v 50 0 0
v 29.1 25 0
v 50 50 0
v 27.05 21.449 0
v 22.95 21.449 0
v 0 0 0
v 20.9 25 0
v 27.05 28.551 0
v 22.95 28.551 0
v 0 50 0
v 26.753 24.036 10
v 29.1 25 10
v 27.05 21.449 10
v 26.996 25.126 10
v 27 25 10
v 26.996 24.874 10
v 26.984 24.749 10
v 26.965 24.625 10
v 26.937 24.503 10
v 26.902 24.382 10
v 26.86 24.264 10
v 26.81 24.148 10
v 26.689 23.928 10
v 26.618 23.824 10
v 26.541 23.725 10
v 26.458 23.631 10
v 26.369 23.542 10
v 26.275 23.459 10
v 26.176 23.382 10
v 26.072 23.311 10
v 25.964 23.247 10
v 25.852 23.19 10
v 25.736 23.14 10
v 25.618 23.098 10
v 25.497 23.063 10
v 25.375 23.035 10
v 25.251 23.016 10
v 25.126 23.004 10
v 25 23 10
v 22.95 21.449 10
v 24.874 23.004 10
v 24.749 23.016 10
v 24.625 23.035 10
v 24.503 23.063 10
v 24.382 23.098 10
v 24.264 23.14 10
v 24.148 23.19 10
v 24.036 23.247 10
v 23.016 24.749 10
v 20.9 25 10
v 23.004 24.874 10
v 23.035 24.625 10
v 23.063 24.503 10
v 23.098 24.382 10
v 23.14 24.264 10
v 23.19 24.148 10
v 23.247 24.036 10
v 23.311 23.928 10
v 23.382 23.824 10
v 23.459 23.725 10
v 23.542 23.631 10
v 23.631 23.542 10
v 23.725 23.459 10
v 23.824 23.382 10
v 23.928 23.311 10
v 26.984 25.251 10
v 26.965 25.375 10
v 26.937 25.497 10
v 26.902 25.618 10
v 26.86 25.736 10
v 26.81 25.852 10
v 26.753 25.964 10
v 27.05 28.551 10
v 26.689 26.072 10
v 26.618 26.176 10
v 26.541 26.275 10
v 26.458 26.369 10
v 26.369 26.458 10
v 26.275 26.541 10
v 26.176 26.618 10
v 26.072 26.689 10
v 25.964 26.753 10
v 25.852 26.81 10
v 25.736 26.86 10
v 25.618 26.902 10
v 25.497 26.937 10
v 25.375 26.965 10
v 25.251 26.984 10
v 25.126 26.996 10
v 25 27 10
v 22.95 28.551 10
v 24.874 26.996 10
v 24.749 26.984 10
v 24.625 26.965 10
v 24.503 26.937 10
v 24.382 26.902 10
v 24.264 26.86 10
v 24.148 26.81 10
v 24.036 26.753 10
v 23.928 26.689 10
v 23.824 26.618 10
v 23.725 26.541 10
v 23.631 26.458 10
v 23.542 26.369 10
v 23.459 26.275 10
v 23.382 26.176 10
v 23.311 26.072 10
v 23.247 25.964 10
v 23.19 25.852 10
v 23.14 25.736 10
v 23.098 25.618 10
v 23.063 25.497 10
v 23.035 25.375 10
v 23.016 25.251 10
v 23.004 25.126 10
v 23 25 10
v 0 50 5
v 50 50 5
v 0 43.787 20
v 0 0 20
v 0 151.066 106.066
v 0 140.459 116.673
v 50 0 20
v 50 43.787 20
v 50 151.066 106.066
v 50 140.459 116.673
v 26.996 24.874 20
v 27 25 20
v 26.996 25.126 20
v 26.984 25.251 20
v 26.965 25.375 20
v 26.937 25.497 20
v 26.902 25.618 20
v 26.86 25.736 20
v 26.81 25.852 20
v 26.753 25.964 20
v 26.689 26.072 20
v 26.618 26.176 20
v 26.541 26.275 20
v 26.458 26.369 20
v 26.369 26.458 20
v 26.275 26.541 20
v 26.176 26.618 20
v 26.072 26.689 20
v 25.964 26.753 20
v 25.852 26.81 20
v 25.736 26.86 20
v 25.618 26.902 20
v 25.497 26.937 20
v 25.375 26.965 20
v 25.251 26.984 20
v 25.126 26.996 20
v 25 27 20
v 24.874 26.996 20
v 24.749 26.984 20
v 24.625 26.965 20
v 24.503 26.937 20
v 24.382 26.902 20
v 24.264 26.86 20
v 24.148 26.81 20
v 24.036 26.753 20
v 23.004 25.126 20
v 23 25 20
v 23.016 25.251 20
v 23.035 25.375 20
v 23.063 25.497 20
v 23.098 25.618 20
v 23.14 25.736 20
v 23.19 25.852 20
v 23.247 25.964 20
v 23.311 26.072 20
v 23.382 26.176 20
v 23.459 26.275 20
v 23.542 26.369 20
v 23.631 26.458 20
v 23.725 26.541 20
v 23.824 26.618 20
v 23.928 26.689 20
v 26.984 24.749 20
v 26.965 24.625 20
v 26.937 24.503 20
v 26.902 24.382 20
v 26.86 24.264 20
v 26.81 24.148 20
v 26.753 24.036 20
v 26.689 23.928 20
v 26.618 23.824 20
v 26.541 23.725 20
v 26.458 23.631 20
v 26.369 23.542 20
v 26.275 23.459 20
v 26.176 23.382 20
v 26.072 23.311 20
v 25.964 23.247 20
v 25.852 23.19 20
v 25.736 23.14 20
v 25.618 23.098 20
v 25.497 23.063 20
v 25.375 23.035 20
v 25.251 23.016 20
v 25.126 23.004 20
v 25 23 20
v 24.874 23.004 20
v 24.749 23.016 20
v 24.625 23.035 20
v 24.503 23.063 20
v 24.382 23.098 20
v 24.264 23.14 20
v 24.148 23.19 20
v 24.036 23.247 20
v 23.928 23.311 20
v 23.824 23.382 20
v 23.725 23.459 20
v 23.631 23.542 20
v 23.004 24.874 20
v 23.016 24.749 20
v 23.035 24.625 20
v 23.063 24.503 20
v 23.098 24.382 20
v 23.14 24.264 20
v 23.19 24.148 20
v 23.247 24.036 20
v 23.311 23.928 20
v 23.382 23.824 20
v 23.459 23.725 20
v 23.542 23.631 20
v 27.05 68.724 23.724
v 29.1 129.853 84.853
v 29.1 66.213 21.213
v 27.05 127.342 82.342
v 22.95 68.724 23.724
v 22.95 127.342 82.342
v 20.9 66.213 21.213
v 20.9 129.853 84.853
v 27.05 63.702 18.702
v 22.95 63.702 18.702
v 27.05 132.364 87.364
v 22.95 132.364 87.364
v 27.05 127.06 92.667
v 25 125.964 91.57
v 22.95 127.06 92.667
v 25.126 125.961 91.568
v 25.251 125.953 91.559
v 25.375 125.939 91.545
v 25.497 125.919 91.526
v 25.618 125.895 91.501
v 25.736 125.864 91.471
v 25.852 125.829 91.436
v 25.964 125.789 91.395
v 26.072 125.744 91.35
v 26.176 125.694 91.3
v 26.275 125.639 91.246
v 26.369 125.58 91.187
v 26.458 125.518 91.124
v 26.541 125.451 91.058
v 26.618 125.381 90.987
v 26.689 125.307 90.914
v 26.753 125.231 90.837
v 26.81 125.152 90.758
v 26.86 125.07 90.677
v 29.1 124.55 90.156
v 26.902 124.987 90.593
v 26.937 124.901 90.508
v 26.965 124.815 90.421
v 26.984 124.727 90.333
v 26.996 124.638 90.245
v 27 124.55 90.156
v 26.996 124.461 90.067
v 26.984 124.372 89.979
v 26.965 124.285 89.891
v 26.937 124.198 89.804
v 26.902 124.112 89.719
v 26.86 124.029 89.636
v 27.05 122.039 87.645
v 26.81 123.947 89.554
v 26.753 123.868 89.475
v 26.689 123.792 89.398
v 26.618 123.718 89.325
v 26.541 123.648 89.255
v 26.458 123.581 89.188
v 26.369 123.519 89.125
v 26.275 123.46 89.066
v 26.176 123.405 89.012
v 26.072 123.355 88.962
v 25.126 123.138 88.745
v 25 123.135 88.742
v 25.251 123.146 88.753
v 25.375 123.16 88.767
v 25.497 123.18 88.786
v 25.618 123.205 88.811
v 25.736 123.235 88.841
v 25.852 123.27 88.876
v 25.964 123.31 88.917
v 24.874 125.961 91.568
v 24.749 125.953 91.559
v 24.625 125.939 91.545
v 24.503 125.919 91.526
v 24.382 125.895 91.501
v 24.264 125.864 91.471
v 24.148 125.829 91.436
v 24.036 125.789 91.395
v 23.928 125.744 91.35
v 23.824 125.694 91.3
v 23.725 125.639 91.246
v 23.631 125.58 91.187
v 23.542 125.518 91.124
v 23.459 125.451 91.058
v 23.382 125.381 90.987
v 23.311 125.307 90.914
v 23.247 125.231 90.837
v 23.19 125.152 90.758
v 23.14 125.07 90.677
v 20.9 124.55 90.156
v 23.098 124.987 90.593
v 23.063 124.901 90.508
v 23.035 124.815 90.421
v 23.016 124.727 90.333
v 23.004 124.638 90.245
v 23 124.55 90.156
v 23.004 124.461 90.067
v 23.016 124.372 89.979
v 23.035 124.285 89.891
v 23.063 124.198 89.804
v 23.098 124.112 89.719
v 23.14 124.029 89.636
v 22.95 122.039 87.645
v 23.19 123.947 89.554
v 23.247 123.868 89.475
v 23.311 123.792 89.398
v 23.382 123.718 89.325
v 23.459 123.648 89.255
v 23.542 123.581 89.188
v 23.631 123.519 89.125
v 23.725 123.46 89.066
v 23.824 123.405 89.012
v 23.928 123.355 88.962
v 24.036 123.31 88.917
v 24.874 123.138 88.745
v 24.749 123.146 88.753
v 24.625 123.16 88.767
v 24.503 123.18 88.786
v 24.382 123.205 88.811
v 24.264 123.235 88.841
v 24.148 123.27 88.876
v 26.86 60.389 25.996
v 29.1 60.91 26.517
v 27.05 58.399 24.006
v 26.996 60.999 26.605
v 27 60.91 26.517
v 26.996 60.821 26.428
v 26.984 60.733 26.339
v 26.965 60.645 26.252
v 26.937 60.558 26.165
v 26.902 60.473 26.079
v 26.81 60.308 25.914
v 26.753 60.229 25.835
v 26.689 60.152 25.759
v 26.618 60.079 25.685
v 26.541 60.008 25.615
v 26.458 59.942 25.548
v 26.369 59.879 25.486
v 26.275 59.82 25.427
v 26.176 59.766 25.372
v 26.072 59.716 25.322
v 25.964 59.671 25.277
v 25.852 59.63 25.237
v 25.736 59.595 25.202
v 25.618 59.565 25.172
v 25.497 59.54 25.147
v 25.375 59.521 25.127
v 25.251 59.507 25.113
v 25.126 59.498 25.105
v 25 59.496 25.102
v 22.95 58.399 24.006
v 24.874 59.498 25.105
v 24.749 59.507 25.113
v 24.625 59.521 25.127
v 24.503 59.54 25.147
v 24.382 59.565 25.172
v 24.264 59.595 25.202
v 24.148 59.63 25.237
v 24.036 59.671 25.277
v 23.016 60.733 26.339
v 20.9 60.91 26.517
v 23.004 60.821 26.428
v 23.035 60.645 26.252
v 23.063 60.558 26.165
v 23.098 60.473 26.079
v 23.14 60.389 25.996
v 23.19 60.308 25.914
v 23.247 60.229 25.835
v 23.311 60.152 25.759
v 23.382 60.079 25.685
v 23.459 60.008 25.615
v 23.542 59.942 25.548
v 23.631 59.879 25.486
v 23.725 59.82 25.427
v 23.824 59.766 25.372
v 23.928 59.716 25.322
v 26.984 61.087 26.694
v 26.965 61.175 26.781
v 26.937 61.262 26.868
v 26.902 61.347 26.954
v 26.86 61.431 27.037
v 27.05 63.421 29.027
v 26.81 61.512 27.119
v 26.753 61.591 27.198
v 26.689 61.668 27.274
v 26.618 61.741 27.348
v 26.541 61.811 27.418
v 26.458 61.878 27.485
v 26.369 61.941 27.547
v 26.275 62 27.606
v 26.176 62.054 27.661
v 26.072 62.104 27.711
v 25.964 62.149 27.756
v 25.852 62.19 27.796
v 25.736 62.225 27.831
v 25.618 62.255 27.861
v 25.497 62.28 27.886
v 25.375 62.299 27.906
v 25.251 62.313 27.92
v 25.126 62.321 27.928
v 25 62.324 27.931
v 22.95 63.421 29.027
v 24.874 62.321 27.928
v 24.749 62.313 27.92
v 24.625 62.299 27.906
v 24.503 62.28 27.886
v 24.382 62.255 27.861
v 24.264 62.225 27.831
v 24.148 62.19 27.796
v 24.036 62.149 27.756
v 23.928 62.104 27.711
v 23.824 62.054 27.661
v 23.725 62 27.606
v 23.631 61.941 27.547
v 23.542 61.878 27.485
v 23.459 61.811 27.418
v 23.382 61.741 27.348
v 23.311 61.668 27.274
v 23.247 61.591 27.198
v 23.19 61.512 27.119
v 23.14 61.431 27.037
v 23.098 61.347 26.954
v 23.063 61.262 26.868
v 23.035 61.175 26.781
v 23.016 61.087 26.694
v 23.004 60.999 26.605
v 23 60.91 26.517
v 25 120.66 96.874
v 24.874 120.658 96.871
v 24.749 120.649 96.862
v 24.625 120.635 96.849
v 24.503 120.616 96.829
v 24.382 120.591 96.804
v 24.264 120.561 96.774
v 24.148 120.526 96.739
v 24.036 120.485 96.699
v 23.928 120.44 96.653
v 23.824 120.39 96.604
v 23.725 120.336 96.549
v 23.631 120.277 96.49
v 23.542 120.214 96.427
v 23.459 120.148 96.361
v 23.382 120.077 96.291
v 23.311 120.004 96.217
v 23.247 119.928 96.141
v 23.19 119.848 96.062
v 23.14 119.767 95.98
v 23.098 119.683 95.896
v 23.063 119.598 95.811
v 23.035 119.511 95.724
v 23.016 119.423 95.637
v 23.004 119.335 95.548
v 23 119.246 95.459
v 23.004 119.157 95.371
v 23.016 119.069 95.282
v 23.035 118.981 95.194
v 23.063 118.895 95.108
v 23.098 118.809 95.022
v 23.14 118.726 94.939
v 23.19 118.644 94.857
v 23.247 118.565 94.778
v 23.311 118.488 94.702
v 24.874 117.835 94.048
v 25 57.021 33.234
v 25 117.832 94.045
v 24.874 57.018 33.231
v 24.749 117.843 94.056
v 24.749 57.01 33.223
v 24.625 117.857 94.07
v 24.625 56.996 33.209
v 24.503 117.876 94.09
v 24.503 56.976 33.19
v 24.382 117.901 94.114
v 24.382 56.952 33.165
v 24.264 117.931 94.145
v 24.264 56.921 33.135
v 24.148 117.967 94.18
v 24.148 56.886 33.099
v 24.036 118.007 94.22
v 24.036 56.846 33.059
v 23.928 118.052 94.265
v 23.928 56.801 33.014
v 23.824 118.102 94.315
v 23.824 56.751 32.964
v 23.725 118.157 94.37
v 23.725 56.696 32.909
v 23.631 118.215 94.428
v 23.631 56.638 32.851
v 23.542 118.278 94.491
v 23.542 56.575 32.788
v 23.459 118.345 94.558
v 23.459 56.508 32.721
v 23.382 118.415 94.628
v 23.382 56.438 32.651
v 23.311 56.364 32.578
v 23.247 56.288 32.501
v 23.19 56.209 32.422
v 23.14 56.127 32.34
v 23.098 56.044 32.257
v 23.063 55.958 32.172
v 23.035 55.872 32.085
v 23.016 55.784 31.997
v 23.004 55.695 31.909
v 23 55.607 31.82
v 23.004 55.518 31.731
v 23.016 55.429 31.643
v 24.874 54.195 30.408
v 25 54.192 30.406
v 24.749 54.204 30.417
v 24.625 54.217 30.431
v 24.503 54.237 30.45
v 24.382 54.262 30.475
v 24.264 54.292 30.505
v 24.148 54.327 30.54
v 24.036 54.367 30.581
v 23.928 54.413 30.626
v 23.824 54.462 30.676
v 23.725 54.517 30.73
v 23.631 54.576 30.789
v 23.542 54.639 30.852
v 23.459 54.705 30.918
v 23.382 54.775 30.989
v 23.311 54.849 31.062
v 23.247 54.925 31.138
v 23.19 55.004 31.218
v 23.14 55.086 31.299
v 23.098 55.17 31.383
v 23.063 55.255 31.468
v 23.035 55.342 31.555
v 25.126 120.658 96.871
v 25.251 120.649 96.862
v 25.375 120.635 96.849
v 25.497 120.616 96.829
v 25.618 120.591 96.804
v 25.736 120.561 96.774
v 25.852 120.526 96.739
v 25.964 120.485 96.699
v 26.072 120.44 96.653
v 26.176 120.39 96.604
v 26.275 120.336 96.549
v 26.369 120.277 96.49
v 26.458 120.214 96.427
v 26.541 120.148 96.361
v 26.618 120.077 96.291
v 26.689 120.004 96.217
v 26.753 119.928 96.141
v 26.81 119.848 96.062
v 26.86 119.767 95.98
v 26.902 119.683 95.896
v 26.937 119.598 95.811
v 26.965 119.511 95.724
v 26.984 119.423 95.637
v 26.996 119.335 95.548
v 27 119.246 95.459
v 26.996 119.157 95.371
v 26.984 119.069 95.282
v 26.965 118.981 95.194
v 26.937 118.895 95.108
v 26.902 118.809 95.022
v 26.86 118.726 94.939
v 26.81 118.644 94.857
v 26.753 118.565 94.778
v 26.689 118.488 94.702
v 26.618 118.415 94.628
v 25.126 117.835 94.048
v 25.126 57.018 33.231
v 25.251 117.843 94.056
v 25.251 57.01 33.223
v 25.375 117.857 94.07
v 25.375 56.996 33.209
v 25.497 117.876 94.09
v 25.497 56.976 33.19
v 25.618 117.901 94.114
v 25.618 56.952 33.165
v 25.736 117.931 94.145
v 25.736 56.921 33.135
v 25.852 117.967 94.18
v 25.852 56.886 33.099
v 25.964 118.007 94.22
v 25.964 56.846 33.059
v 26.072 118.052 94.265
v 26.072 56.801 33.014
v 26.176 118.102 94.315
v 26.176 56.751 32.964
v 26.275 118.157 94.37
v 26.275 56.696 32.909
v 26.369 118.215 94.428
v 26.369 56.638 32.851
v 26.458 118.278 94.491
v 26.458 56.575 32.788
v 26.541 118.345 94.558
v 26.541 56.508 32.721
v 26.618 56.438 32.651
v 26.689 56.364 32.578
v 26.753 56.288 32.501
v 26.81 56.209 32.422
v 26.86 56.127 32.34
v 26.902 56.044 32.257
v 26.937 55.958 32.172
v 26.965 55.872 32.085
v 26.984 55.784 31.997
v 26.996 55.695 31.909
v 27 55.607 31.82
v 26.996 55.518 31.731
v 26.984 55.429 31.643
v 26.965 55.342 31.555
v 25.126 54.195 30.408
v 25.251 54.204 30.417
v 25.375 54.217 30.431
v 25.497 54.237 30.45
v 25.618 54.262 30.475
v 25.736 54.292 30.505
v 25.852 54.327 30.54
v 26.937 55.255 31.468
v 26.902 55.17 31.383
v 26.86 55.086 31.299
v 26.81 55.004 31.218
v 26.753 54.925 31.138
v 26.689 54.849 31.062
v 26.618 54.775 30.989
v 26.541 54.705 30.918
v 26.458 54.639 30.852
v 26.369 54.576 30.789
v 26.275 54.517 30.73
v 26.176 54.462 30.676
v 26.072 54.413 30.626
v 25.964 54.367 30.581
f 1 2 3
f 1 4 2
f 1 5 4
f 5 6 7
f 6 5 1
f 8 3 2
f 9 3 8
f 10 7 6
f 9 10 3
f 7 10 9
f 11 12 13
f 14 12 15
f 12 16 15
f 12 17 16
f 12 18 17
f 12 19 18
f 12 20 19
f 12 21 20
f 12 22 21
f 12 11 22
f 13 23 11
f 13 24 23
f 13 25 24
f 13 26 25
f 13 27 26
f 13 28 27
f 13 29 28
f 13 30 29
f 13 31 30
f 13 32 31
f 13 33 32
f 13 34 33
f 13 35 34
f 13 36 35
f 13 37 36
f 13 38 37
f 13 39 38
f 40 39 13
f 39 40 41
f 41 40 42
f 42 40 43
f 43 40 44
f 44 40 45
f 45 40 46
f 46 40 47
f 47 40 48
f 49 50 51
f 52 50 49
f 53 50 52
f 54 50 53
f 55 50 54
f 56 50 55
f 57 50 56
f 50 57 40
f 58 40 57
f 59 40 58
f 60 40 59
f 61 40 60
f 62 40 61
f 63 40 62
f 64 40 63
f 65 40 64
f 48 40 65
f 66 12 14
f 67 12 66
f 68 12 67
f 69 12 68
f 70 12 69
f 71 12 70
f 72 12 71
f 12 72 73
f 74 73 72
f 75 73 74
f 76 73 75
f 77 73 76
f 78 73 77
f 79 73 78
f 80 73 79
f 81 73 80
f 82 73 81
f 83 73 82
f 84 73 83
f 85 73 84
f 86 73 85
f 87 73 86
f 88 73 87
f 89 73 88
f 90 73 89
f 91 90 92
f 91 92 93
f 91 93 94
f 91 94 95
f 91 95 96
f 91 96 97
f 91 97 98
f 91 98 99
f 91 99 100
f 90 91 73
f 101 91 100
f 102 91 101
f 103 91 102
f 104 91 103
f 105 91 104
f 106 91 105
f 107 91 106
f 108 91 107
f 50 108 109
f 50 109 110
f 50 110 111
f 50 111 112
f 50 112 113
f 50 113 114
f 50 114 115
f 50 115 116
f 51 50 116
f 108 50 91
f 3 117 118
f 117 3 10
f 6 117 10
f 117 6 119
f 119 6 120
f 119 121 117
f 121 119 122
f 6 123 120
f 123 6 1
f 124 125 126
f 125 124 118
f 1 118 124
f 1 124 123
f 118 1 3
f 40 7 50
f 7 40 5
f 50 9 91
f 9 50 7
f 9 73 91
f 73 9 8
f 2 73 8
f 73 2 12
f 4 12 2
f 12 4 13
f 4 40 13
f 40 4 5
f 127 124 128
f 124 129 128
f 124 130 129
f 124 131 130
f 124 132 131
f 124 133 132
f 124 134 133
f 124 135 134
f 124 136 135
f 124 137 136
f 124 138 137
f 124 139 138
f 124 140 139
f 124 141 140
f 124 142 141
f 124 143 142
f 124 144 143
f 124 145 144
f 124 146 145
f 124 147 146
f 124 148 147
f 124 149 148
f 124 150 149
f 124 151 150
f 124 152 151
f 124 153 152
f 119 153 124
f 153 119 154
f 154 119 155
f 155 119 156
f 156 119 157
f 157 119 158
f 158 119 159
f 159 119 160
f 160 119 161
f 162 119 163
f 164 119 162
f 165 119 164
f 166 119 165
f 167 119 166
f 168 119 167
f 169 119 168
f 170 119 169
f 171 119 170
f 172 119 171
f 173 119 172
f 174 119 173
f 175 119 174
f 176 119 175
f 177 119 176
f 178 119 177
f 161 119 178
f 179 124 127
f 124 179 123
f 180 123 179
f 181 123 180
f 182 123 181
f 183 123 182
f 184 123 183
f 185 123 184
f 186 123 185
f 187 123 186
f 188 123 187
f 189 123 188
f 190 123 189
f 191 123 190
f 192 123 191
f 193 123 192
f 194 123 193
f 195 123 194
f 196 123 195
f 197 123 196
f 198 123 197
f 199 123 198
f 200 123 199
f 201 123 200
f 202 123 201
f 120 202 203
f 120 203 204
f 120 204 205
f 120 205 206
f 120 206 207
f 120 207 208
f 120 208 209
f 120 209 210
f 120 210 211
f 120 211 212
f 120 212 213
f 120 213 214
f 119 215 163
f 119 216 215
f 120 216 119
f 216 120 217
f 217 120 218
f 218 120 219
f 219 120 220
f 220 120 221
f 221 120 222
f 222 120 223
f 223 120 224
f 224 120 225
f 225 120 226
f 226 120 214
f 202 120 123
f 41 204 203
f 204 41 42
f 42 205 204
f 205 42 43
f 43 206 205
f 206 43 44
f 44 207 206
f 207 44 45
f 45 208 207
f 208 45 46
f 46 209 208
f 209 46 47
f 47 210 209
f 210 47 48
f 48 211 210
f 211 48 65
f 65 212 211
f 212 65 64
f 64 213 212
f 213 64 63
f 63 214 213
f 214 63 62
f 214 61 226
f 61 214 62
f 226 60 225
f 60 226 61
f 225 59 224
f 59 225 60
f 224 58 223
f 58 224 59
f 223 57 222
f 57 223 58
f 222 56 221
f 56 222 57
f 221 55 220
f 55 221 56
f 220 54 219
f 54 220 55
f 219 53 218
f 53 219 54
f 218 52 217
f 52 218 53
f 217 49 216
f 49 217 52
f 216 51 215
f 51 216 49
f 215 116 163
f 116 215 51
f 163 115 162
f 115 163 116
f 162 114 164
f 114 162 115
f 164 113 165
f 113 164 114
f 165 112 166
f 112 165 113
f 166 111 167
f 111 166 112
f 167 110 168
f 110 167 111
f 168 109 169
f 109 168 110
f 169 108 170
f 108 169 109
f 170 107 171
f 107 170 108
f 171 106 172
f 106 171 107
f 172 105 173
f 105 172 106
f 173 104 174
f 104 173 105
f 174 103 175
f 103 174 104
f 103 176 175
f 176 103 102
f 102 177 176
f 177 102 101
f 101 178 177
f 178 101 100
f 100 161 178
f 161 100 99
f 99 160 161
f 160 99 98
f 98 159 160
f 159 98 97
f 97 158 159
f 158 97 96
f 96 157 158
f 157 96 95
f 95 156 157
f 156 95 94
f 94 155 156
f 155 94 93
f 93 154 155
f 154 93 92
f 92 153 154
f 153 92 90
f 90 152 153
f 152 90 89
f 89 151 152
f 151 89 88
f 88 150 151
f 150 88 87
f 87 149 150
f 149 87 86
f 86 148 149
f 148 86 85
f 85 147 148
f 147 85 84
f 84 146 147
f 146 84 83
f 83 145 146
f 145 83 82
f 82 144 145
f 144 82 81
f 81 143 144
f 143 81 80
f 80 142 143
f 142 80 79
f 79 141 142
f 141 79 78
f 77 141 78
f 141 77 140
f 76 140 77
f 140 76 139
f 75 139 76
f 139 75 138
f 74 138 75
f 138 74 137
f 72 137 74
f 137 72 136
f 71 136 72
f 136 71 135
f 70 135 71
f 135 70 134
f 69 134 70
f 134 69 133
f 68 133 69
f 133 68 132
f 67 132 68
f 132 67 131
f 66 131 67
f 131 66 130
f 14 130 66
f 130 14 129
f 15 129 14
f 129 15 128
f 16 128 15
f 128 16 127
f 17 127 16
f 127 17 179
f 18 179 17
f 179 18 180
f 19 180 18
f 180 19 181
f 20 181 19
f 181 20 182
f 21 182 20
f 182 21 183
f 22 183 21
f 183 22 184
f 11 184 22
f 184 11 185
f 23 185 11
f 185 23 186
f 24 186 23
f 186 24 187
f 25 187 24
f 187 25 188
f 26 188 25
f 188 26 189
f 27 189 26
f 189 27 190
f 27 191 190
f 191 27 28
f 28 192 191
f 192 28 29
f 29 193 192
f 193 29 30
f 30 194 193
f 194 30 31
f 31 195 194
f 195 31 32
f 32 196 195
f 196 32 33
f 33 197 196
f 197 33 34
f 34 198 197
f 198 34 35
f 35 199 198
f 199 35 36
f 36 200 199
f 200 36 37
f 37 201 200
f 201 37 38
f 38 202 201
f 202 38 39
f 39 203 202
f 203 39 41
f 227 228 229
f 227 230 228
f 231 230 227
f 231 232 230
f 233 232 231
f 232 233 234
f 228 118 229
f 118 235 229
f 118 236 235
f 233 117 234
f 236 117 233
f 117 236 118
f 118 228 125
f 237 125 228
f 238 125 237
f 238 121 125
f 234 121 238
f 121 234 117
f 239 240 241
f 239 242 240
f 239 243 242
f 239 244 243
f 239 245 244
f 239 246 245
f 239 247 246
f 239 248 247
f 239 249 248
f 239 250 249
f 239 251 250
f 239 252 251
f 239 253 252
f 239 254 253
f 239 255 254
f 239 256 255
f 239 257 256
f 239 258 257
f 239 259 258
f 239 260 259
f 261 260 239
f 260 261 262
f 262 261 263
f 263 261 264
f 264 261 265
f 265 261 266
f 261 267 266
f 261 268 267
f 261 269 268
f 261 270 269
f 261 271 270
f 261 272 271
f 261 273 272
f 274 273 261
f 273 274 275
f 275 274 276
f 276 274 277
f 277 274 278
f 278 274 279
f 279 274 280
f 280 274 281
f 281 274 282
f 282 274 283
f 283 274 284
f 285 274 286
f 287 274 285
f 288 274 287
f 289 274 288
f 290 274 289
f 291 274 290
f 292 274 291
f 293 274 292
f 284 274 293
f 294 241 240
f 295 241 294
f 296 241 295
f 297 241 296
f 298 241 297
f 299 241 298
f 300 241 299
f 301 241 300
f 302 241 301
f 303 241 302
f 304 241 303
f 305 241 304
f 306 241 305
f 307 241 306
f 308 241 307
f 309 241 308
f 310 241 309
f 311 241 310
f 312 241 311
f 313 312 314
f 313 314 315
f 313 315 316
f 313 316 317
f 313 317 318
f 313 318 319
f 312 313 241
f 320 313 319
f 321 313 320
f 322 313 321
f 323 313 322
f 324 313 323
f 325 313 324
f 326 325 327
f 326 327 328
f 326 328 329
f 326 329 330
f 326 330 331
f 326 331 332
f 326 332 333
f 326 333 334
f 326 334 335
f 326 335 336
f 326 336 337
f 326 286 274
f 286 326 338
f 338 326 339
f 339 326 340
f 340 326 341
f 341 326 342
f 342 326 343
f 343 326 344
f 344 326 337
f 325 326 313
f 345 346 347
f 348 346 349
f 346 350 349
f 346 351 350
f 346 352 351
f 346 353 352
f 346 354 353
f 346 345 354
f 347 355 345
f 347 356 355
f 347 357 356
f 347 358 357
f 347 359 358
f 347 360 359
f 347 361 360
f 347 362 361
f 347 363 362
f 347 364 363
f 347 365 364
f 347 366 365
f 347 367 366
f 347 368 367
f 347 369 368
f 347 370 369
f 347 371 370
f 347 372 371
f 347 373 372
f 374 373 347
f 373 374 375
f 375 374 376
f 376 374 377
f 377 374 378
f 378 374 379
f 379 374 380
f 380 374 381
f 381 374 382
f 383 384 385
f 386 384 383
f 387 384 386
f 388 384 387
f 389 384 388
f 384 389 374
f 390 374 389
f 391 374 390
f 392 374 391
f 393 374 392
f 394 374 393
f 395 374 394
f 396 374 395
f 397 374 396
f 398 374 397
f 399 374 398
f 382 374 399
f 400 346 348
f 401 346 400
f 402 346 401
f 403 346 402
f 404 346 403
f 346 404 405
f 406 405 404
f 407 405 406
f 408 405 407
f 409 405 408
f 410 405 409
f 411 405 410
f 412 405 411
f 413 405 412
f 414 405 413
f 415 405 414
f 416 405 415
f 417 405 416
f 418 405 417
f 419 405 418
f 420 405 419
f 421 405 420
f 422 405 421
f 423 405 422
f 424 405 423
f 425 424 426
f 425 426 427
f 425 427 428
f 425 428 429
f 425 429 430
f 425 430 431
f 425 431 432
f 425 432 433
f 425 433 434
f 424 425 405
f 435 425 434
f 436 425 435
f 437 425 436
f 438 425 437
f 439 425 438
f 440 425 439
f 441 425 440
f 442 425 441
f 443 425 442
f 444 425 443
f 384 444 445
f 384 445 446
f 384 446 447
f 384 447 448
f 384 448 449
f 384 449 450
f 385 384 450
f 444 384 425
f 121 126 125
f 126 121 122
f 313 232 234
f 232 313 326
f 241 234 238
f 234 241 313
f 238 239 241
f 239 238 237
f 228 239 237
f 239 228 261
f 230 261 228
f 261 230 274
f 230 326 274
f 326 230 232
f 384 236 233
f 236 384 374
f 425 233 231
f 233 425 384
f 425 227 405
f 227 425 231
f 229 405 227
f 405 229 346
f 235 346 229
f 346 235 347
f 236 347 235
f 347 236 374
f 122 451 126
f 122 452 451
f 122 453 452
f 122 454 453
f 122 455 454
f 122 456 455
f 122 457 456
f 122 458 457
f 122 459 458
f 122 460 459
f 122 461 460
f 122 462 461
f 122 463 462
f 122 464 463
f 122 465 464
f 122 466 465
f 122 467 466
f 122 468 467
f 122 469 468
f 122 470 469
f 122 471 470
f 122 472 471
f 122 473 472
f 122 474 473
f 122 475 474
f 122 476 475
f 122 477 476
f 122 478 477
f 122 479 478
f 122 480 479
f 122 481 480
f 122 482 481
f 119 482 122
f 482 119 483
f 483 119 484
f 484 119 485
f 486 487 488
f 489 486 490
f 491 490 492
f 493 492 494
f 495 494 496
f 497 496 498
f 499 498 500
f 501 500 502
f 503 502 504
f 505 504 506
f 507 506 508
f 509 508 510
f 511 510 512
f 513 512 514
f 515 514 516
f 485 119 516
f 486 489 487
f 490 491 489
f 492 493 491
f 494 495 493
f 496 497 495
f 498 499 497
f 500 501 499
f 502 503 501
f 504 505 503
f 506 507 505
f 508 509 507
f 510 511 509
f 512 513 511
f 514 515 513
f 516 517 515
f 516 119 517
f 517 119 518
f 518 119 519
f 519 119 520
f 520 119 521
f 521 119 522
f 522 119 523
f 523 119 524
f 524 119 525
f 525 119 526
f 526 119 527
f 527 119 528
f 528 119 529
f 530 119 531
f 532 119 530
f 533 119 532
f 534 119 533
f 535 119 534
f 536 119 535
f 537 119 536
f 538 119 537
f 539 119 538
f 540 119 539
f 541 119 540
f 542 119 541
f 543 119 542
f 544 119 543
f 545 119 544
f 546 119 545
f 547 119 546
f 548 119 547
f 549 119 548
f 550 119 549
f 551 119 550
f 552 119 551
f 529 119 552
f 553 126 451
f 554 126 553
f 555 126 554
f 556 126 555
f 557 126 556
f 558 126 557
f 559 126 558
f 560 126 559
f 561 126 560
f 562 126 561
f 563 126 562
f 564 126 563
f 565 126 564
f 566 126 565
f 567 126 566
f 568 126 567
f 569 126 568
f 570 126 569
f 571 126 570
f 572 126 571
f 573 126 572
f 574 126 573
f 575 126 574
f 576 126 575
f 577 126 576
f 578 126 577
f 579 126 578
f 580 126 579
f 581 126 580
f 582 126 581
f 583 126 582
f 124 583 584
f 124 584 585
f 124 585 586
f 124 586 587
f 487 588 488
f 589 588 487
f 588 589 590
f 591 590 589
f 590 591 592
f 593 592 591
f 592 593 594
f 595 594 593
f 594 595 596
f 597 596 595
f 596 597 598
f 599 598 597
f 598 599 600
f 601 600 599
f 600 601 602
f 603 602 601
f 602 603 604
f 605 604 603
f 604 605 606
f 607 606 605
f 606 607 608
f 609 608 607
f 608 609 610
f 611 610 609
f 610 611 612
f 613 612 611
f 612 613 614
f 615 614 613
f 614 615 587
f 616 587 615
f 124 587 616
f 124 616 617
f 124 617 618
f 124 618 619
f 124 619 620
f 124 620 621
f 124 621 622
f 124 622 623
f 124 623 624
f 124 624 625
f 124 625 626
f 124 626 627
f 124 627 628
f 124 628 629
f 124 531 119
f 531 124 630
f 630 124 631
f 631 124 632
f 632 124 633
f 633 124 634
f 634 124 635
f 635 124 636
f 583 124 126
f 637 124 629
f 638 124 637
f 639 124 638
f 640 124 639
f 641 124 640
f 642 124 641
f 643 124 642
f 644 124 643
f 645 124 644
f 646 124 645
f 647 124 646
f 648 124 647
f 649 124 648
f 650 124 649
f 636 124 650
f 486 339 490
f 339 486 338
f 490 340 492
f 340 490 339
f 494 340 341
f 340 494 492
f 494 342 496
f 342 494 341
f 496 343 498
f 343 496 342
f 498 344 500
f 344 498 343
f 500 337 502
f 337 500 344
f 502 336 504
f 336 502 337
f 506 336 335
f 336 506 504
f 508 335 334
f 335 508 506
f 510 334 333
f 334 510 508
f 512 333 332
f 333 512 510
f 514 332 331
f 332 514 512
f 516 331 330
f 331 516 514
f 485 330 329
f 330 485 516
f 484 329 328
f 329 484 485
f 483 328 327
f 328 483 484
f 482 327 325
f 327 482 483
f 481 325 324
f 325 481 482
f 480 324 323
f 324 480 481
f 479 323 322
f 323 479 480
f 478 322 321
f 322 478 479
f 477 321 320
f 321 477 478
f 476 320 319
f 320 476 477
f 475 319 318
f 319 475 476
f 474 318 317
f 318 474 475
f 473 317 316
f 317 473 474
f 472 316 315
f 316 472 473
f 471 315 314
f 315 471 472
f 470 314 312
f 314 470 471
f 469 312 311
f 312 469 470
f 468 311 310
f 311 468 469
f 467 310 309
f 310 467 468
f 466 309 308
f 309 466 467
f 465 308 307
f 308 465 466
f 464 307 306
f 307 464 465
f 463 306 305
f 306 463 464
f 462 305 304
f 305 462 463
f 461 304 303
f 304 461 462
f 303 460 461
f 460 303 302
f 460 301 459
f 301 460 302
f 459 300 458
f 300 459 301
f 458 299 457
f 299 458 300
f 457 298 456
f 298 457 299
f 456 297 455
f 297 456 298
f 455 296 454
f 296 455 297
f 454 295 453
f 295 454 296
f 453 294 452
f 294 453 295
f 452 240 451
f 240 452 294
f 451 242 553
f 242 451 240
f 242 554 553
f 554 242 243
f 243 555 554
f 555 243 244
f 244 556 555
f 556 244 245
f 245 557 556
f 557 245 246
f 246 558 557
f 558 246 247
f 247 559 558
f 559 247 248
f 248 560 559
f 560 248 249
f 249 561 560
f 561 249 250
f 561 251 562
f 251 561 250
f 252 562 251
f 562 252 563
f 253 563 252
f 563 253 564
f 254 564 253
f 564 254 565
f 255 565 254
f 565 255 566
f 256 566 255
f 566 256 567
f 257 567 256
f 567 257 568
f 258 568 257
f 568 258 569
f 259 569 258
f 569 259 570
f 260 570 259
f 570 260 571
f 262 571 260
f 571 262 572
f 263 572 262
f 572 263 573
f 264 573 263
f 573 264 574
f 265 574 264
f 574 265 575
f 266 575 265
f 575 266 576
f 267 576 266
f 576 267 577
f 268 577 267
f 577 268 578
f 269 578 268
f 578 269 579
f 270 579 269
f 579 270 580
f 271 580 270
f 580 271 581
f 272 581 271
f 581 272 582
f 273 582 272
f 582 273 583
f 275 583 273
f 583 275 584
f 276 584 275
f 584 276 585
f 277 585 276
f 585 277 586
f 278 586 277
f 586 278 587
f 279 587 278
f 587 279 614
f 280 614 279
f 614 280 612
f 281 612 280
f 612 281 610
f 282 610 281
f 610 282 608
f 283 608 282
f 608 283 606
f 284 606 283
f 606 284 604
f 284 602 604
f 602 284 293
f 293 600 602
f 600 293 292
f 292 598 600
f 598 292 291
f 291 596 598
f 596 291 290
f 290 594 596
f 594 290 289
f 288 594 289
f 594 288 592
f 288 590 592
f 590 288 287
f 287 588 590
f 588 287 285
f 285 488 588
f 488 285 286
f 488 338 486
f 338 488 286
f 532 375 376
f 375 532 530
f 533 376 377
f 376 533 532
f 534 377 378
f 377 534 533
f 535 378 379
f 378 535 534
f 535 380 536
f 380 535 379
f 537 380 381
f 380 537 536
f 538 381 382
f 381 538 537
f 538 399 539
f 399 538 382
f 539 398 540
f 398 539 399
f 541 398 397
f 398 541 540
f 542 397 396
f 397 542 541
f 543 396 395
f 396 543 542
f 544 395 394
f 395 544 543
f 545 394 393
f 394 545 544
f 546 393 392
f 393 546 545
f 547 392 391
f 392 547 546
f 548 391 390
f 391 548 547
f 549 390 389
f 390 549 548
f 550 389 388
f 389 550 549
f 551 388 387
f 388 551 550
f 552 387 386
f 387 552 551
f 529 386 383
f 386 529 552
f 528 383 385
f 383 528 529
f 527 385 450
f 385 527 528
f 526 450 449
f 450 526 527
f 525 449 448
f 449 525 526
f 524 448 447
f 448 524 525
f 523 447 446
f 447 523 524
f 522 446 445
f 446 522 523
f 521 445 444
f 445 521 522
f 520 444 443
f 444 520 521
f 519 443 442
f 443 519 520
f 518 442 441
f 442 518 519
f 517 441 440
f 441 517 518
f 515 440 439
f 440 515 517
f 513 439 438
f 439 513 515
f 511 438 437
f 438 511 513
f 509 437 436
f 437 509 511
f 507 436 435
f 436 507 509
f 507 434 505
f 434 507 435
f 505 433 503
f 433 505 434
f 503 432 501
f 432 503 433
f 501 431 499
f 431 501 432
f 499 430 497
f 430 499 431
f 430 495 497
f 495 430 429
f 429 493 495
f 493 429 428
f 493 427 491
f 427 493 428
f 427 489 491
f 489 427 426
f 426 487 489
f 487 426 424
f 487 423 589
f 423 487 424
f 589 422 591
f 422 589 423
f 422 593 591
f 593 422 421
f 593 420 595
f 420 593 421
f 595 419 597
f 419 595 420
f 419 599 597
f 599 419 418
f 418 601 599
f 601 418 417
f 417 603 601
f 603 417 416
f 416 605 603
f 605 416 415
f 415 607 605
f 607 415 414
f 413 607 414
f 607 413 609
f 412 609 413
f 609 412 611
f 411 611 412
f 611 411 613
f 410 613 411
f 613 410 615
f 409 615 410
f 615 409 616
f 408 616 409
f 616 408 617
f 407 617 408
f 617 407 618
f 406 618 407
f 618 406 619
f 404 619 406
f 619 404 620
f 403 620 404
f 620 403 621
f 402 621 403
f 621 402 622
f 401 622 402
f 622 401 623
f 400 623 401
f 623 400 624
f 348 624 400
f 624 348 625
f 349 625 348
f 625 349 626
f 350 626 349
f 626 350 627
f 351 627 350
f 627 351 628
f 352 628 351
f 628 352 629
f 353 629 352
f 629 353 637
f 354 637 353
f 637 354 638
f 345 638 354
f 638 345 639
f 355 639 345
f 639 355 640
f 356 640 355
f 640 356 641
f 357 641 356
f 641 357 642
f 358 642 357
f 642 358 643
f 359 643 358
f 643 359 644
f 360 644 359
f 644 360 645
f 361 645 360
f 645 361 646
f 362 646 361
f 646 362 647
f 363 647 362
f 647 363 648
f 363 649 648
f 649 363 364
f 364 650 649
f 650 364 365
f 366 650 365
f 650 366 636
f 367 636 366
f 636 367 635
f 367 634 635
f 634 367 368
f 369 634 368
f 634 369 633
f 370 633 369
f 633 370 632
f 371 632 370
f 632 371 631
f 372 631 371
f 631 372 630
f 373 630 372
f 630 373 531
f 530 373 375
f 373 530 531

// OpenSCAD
CONNECTOR_WIDTH = 50;
CONNECTOR_DEPTH = 20;
CONNECTOR_HEIGHT = 50;
CONNECTOR_LAYER = CONNECTOR_DEPTH / 2;
HANGER_WIDTH = CONNECTOR_WIDTH;
HANGER_DEPTH = 15;
HANGER_HEIGHT = 150;
HANGER_LAYER = HANGER_DEPTH / 2;
HANGER_FIRST_HOLE = 30;
HANGER_SECOND_HOLE = HANGER_HEIGHT - HANGER_FIRST_HOLE;


module main(){
  CONNECTION_OFFSET = 5;
  
  connector();
  translate([0, CONNECTOR_HEIGHT - CONNECTION_OFFSET, 0])
    rotate([45, 0, 0])
  hanger();
}

module connector(){
  linear_extrude(CONNECTOR_LAYER) {
    difference(){
      square([CONNECTOR_WIDTH, CONNECTOR_HEIGHT]);
      translate([CONNECTOR_WIDTH/2, CONNECTOR_HEIGHT/2])
      m4_nut_2d();
    }
  }

  translate([0, 0, CONNECTOR_LAYER])
  linear_extrude(CONNECTOR_LAYER) {
    difference(){
      square([CONNECTOR_WIDTH, CONNECTOR_HEIGHT]);
      translate([CONNECTOR_WIDTH/2, CONNECTOR_HEIGHT/2])
      m4_screw_2d();
    }
  }
}

module hanger(){
  
  linear_extrude(HANGER_LAYER) {
    difference(){
      square([HANGER_WIDTH, HANGER_HEIGHT]);
      translate([HANGER_WIDTH/2, HANGER_FIRST_HOLE])
      m4_nut_2d();
      translate([HANGER_WIDTH/2, HANGER_SECOND_HOLE])
      m4_nut_2d();      
    }
  }

  translate([0, 0, HANGER_LAYER])
  linear_extrude(HANGER_LAYER) {
    difference(){
      square([HANGER_WIDTH, HANGER_HEIGHT]);
      translate([HANGER_WIDTH/2, HANGER_FIRST_HOLE])
      m4_screw_2d();
      translate([HANGER_WIDTH/2, HANGER_SECOND_HOLE])
      m4_screw_2d();      
    }
  }
  
}

module m4_screw_2d(){
  $fn = 100;
  circle(2);
}


module m4_screw_3d(length){
  linear_extrude(length)
    m4_screw_2d();
}

module m4_nut_2d(){
  $fn = 6;
  circle(4.1);
}
module m4_nut_3d(length){
  linear_extrude(length)
  m4_nut_2d();
}


main();
